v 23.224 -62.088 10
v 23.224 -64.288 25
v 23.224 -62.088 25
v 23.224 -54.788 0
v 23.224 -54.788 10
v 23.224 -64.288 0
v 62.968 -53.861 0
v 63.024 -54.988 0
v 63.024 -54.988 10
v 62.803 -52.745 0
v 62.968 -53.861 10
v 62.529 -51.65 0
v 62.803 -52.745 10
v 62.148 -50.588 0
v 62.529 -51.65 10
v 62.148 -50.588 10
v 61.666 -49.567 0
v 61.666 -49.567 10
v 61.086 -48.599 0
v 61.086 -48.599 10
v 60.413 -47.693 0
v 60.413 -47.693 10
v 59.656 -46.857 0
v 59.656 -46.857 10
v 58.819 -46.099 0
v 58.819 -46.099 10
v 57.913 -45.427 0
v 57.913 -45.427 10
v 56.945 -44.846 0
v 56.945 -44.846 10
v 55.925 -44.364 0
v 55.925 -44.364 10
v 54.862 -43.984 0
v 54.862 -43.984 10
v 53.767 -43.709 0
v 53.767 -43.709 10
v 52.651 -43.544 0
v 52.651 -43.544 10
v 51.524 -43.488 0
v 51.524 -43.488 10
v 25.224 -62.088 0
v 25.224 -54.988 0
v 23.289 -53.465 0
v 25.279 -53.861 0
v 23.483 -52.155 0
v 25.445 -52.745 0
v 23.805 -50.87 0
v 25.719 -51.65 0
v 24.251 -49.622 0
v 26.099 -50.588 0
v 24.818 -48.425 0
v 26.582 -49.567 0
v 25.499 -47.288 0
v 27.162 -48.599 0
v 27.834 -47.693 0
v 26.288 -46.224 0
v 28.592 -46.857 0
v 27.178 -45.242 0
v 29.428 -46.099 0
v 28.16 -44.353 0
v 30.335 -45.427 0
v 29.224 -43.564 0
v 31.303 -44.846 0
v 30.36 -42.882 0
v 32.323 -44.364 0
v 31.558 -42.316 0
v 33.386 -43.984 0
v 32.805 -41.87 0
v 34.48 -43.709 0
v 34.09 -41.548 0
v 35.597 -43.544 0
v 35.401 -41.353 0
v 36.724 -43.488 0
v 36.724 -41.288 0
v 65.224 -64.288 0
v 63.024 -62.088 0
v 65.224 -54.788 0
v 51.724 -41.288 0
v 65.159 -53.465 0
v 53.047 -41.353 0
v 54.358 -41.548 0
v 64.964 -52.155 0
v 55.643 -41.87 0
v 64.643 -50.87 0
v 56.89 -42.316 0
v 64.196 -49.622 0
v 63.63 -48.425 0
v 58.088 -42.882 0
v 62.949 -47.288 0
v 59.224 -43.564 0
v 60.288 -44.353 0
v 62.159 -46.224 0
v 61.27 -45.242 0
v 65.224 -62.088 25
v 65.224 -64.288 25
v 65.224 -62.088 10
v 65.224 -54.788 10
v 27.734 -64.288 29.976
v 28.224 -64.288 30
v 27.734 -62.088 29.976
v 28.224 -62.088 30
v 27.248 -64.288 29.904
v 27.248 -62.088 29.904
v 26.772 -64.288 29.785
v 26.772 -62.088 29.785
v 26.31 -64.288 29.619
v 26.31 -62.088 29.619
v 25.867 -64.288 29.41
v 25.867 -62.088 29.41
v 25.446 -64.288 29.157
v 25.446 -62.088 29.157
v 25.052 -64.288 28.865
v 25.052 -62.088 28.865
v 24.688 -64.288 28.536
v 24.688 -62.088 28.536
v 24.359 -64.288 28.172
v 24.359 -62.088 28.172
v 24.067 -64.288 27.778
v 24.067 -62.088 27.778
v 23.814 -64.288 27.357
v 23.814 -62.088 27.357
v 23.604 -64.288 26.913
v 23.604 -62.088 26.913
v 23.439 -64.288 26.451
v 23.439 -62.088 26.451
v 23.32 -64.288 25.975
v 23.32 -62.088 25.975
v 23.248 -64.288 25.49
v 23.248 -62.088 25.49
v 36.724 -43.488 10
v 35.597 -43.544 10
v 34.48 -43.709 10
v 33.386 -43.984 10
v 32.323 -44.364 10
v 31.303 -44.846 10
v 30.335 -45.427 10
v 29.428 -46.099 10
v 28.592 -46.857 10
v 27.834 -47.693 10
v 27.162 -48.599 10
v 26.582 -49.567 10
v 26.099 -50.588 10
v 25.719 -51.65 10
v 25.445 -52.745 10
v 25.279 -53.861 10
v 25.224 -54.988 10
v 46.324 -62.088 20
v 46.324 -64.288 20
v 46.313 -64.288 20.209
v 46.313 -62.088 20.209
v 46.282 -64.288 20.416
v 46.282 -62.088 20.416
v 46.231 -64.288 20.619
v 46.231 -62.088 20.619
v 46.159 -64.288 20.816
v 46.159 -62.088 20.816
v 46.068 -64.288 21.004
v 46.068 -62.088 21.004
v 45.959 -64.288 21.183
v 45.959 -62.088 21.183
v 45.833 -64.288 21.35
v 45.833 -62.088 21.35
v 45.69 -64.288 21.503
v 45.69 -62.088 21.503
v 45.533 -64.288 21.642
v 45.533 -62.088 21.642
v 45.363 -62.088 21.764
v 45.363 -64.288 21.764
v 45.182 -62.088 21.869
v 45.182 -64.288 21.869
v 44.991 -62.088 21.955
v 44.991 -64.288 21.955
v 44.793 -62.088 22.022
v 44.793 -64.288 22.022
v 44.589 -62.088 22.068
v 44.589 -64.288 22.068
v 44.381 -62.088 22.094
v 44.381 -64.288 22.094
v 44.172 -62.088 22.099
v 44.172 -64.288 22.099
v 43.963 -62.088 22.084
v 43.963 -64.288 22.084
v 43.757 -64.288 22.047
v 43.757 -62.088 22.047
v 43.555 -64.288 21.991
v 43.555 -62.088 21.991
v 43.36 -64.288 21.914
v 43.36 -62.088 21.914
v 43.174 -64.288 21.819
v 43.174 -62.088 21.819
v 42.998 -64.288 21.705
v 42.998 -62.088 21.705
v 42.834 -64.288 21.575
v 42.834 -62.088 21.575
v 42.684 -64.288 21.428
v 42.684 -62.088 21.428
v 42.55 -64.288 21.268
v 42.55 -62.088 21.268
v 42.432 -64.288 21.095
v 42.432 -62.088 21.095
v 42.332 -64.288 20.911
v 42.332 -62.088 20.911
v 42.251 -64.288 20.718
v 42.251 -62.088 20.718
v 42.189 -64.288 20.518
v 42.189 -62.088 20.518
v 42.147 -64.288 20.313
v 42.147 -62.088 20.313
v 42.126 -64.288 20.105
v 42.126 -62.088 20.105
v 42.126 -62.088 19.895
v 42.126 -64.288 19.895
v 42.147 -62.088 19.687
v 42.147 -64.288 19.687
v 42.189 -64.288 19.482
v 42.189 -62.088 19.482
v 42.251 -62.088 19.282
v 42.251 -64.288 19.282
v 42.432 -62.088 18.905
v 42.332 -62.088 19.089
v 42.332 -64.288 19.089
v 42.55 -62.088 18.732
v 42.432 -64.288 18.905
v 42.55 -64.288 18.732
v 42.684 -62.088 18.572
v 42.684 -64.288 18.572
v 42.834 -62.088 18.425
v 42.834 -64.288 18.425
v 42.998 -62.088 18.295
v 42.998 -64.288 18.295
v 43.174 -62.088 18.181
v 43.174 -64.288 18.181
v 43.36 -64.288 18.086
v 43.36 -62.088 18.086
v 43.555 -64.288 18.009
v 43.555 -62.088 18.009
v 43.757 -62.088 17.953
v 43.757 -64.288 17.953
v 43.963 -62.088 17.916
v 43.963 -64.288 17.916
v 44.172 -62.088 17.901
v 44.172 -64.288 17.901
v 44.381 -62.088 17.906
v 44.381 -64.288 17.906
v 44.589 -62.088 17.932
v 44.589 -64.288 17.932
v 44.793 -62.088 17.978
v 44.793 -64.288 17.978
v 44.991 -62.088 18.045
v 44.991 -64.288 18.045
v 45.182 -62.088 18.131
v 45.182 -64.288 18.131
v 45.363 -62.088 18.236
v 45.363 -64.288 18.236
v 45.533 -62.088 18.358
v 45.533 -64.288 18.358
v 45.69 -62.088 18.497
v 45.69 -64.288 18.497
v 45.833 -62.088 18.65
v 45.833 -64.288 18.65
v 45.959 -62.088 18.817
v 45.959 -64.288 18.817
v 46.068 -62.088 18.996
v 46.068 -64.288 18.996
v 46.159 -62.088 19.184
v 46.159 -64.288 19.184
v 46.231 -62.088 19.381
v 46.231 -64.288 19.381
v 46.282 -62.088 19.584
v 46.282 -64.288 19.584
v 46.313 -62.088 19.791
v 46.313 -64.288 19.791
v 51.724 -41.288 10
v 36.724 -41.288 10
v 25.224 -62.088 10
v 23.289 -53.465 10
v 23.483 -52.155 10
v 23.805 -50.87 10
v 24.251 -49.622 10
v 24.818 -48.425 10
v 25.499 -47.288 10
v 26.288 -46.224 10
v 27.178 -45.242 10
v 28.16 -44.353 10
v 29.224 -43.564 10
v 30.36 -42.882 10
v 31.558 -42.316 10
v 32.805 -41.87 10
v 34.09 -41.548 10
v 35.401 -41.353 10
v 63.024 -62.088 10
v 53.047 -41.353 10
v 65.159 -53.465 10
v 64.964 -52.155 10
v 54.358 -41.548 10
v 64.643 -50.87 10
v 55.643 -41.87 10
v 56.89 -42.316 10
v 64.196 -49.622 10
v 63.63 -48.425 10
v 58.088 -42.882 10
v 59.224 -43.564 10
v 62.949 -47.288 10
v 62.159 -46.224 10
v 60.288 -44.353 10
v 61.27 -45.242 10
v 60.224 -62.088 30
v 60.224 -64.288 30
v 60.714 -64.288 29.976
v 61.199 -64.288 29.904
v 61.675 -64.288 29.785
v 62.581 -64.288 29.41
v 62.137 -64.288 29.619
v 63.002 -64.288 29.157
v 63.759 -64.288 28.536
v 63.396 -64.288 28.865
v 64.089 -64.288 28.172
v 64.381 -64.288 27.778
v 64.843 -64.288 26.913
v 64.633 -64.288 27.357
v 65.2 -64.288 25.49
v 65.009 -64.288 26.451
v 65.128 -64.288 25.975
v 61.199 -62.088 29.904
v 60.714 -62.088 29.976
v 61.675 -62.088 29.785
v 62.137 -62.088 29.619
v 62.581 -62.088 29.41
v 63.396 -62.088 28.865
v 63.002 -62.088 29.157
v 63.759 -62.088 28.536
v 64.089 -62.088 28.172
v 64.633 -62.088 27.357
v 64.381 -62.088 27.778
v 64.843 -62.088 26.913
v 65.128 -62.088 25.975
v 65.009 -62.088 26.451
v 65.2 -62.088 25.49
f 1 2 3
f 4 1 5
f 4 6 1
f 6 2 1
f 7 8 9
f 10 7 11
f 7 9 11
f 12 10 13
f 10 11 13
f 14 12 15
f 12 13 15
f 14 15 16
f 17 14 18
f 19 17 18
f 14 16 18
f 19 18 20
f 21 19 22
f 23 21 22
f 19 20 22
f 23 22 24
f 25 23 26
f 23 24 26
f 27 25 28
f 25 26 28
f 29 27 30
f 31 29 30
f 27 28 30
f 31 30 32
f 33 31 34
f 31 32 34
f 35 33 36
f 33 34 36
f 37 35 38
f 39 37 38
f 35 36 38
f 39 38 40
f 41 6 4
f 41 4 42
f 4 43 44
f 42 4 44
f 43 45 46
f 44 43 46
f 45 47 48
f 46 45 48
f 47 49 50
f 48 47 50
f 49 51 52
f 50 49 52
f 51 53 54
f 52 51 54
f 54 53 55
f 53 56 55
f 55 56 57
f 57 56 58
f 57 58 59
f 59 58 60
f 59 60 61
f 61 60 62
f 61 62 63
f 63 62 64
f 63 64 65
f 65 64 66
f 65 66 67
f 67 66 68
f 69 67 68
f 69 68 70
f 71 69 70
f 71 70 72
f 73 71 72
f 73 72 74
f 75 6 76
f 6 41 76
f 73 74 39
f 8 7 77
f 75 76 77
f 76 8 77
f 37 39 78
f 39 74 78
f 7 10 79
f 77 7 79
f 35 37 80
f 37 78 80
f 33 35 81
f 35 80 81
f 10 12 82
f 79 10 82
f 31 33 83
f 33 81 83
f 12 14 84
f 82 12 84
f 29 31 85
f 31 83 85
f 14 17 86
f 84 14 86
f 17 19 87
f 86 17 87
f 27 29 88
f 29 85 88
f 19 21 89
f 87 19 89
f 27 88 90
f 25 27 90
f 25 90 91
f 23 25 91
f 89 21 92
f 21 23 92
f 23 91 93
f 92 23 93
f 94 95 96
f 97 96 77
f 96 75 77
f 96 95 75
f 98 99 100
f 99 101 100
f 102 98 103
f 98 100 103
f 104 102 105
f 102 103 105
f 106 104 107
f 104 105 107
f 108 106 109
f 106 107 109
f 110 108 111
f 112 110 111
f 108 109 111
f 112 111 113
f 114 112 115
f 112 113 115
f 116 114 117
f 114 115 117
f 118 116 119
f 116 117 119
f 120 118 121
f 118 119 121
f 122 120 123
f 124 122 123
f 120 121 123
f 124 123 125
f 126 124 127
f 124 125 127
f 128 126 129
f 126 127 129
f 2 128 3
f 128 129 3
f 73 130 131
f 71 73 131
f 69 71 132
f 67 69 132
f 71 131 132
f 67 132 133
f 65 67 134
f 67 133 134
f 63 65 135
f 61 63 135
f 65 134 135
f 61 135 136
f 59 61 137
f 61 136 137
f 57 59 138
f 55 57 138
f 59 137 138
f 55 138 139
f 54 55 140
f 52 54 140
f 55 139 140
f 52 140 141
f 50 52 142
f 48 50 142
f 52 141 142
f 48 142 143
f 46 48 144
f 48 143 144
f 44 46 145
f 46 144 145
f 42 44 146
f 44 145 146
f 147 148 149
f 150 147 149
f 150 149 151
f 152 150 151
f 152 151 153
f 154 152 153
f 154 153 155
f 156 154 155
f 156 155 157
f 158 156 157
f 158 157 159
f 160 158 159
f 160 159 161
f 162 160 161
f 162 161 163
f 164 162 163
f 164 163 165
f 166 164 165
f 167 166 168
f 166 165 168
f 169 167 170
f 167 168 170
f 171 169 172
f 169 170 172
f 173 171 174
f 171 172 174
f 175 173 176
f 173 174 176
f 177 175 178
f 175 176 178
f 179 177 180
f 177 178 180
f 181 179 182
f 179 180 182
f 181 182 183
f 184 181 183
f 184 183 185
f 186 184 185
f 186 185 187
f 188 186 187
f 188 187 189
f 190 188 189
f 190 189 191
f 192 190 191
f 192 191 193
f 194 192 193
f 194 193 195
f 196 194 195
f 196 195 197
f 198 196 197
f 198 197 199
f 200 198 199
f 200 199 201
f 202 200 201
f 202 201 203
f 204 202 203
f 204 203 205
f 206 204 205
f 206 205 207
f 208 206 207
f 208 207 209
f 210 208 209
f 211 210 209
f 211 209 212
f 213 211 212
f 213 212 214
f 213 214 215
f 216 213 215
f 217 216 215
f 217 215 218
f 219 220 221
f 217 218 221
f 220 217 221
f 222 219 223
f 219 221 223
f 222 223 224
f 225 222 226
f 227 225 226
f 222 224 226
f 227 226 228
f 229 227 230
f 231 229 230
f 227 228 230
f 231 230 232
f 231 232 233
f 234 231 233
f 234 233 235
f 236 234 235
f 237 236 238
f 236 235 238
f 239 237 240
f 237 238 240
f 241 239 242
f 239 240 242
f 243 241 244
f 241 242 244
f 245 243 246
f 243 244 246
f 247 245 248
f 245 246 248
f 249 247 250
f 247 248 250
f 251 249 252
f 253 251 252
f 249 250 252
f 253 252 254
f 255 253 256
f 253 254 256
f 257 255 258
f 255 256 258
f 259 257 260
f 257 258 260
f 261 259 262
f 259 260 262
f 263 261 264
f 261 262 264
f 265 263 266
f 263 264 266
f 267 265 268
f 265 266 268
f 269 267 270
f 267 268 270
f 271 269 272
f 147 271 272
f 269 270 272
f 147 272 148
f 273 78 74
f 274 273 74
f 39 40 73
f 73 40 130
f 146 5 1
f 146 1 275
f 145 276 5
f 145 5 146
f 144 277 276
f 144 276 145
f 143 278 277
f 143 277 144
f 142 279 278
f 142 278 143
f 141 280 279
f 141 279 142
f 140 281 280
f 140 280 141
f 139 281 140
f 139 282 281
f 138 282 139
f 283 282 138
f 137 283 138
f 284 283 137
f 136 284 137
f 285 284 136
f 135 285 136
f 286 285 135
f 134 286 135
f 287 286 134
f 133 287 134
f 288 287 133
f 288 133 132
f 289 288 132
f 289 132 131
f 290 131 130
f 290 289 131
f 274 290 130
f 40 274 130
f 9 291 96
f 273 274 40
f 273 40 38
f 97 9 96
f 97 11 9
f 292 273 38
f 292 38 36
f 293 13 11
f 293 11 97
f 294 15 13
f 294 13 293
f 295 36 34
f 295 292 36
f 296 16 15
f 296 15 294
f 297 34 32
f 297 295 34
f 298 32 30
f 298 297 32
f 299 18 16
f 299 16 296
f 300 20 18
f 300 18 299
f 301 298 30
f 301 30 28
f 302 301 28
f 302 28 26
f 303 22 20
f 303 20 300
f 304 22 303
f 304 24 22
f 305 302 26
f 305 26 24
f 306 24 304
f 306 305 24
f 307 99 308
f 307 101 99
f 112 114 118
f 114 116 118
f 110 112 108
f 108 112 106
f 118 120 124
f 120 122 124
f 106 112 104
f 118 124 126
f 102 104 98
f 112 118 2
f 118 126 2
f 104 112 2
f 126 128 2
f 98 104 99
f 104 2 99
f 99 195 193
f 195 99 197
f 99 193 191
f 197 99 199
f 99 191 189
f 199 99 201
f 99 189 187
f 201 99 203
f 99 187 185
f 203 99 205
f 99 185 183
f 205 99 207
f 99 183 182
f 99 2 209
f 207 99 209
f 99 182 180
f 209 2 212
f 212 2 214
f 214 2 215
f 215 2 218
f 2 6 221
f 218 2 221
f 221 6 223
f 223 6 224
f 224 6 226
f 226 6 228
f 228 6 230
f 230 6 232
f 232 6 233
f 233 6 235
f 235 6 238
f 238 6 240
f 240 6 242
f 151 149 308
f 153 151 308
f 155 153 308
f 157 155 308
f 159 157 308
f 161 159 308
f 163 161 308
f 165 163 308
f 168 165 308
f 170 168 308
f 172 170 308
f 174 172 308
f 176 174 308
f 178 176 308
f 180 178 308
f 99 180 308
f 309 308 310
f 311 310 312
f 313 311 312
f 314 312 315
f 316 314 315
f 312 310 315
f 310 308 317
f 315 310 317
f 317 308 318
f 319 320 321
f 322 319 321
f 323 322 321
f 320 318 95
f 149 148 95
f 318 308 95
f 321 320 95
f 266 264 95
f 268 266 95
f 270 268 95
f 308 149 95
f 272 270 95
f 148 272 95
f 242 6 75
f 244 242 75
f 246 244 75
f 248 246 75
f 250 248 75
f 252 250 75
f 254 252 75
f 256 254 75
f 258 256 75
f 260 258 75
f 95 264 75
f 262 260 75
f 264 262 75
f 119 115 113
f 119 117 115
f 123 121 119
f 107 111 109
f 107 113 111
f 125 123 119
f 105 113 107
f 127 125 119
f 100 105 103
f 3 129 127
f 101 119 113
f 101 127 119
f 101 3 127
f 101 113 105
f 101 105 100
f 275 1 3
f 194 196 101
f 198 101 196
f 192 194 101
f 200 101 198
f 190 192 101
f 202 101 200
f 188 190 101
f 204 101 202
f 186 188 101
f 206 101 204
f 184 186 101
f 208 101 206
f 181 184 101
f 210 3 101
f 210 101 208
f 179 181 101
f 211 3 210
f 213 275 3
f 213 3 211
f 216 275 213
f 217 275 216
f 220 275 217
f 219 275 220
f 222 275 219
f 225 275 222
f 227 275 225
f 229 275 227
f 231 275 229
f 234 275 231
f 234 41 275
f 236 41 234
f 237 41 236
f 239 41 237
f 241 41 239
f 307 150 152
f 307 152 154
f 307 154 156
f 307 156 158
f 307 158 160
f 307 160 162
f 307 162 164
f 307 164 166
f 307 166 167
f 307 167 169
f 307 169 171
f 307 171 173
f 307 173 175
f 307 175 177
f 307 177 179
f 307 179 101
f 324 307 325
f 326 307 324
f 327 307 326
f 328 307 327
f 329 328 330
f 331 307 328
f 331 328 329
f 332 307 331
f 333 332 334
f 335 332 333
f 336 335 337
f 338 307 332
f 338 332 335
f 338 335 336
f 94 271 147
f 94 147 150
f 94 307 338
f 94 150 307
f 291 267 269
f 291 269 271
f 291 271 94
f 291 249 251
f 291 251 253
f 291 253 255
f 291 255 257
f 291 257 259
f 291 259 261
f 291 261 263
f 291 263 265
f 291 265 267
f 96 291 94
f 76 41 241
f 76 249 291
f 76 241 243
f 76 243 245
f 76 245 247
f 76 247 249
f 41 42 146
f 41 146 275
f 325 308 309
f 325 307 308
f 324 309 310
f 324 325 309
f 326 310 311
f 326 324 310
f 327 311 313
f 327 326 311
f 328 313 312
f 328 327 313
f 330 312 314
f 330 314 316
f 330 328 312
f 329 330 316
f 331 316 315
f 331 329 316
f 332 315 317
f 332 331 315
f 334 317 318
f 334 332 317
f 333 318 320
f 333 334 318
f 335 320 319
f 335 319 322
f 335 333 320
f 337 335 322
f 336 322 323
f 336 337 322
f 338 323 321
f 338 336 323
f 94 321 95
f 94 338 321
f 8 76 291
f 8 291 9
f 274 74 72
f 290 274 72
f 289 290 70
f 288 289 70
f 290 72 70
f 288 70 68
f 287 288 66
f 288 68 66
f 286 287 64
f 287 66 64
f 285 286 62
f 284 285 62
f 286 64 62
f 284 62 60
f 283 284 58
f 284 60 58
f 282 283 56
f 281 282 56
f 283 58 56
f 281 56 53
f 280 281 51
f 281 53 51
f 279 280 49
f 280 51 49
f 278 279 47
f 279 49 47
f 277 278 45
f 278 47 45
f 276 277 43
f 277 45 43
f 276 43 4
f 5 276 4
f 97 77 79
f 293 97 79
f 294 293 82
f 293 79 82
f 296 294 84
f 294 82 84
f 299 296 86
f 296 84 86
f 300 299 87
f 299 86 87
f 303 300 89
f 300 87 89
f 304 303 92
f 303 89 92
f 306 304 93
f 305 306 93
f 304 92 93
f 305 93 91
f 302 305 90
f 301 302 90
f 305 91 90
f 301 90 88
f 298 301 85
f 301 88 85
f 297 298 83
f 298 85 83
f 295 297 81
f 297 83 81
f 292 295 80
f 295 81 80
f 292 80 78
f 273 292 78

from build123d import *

# Parameters (mm, degrees)
F1_DEPTH = 10
F3_DEPTH = 25
F4_W     = 42
F4_H     = 2.2
F5_DEPTH = 20
F6_R     = 2.1
F7_DEPTH = 4
F8_R     = 5
F9_R     = 5


with BuildPart() as f1:
    # F0 (on Top) → F1 (new body)
    with BuildSketch(Plane.XY):
        with BuildLine():
            Line((51.723857, -41.288426), (36.723857, -41.288426))
            ThreePointArc((36.723857, -41.288426), (27.177916, -45.242484), (23.223857, -54.788426))
            Line((23.223857, -54.788426), (23.223857, -64.288426))
            Line((23.223857, -64.288426), (65.223857, -64.288426))
            Line((65.223857, -64.288426), (65.223857, -54.788426))
            ThreePointArc((65.223857, -54.788426), (61.269799, -45.242484), (51.723857, -41.288426))
        make_face()
    extrude(amount=F1_DEPTH)

    # F2 (on face) → F3 (cut)
    with BuildSketch(Plane.XY.offset(10)):
        with BuildLine():
            Line((51.523857, -43.488426), (36.723857, -43.488426))
            ThreePointArc((36.723857, -43.488426), (28.592129, -46.856698), (25.223857, -54.988426))
            Line((25.223857, -54.988426), (25.223857, -62.088426))
            Line((25.223857, -62.088426), (63.023857, -62.088426))
            Line((63.023857, -62.088426), (63.023857, -54.988426))
            ThreePointArc((63.023857, -54.988426), (59.655585, -46.856698), (51.523857, -43.488426))
        make_face()
    extrude(amount=-F3_DEPTH, mode=Mode.SUBTRACT)

    # F4 (on face) → F5 (join)
    with BuildSketch(Plane.XY.offset(10)):
        with Locations((44.223857, -63.188426)):
            Rectangle(F4_W, F4_H)
    extrude(amount=F5_DEPTH)

    # F6 (on face) → F7 (cut)
    with BuildSketch(Plane.XZ.offset(64.288426)):
        with Locations((44.223857, 20)):
            Circle(F6_R)
    extrude(amount=-F7_DEPTH, mode=Mode.SUBTRACT)

    # F8
    f8_edges = [f1.edges().sort_by_distance(p)[0] for p in [
        (65.223857, -63.188426, 30),
    ]]
    fillet(f8_edges, radius=F8_R)

    # F9
    f9_edges = [f1.edges().sort_by_distance(p)[0] for p in [
        (23.223857, -63.188426, 30),
    ]]
    fillet(f9_edges, radius=F9_R)


solid = f1.part
